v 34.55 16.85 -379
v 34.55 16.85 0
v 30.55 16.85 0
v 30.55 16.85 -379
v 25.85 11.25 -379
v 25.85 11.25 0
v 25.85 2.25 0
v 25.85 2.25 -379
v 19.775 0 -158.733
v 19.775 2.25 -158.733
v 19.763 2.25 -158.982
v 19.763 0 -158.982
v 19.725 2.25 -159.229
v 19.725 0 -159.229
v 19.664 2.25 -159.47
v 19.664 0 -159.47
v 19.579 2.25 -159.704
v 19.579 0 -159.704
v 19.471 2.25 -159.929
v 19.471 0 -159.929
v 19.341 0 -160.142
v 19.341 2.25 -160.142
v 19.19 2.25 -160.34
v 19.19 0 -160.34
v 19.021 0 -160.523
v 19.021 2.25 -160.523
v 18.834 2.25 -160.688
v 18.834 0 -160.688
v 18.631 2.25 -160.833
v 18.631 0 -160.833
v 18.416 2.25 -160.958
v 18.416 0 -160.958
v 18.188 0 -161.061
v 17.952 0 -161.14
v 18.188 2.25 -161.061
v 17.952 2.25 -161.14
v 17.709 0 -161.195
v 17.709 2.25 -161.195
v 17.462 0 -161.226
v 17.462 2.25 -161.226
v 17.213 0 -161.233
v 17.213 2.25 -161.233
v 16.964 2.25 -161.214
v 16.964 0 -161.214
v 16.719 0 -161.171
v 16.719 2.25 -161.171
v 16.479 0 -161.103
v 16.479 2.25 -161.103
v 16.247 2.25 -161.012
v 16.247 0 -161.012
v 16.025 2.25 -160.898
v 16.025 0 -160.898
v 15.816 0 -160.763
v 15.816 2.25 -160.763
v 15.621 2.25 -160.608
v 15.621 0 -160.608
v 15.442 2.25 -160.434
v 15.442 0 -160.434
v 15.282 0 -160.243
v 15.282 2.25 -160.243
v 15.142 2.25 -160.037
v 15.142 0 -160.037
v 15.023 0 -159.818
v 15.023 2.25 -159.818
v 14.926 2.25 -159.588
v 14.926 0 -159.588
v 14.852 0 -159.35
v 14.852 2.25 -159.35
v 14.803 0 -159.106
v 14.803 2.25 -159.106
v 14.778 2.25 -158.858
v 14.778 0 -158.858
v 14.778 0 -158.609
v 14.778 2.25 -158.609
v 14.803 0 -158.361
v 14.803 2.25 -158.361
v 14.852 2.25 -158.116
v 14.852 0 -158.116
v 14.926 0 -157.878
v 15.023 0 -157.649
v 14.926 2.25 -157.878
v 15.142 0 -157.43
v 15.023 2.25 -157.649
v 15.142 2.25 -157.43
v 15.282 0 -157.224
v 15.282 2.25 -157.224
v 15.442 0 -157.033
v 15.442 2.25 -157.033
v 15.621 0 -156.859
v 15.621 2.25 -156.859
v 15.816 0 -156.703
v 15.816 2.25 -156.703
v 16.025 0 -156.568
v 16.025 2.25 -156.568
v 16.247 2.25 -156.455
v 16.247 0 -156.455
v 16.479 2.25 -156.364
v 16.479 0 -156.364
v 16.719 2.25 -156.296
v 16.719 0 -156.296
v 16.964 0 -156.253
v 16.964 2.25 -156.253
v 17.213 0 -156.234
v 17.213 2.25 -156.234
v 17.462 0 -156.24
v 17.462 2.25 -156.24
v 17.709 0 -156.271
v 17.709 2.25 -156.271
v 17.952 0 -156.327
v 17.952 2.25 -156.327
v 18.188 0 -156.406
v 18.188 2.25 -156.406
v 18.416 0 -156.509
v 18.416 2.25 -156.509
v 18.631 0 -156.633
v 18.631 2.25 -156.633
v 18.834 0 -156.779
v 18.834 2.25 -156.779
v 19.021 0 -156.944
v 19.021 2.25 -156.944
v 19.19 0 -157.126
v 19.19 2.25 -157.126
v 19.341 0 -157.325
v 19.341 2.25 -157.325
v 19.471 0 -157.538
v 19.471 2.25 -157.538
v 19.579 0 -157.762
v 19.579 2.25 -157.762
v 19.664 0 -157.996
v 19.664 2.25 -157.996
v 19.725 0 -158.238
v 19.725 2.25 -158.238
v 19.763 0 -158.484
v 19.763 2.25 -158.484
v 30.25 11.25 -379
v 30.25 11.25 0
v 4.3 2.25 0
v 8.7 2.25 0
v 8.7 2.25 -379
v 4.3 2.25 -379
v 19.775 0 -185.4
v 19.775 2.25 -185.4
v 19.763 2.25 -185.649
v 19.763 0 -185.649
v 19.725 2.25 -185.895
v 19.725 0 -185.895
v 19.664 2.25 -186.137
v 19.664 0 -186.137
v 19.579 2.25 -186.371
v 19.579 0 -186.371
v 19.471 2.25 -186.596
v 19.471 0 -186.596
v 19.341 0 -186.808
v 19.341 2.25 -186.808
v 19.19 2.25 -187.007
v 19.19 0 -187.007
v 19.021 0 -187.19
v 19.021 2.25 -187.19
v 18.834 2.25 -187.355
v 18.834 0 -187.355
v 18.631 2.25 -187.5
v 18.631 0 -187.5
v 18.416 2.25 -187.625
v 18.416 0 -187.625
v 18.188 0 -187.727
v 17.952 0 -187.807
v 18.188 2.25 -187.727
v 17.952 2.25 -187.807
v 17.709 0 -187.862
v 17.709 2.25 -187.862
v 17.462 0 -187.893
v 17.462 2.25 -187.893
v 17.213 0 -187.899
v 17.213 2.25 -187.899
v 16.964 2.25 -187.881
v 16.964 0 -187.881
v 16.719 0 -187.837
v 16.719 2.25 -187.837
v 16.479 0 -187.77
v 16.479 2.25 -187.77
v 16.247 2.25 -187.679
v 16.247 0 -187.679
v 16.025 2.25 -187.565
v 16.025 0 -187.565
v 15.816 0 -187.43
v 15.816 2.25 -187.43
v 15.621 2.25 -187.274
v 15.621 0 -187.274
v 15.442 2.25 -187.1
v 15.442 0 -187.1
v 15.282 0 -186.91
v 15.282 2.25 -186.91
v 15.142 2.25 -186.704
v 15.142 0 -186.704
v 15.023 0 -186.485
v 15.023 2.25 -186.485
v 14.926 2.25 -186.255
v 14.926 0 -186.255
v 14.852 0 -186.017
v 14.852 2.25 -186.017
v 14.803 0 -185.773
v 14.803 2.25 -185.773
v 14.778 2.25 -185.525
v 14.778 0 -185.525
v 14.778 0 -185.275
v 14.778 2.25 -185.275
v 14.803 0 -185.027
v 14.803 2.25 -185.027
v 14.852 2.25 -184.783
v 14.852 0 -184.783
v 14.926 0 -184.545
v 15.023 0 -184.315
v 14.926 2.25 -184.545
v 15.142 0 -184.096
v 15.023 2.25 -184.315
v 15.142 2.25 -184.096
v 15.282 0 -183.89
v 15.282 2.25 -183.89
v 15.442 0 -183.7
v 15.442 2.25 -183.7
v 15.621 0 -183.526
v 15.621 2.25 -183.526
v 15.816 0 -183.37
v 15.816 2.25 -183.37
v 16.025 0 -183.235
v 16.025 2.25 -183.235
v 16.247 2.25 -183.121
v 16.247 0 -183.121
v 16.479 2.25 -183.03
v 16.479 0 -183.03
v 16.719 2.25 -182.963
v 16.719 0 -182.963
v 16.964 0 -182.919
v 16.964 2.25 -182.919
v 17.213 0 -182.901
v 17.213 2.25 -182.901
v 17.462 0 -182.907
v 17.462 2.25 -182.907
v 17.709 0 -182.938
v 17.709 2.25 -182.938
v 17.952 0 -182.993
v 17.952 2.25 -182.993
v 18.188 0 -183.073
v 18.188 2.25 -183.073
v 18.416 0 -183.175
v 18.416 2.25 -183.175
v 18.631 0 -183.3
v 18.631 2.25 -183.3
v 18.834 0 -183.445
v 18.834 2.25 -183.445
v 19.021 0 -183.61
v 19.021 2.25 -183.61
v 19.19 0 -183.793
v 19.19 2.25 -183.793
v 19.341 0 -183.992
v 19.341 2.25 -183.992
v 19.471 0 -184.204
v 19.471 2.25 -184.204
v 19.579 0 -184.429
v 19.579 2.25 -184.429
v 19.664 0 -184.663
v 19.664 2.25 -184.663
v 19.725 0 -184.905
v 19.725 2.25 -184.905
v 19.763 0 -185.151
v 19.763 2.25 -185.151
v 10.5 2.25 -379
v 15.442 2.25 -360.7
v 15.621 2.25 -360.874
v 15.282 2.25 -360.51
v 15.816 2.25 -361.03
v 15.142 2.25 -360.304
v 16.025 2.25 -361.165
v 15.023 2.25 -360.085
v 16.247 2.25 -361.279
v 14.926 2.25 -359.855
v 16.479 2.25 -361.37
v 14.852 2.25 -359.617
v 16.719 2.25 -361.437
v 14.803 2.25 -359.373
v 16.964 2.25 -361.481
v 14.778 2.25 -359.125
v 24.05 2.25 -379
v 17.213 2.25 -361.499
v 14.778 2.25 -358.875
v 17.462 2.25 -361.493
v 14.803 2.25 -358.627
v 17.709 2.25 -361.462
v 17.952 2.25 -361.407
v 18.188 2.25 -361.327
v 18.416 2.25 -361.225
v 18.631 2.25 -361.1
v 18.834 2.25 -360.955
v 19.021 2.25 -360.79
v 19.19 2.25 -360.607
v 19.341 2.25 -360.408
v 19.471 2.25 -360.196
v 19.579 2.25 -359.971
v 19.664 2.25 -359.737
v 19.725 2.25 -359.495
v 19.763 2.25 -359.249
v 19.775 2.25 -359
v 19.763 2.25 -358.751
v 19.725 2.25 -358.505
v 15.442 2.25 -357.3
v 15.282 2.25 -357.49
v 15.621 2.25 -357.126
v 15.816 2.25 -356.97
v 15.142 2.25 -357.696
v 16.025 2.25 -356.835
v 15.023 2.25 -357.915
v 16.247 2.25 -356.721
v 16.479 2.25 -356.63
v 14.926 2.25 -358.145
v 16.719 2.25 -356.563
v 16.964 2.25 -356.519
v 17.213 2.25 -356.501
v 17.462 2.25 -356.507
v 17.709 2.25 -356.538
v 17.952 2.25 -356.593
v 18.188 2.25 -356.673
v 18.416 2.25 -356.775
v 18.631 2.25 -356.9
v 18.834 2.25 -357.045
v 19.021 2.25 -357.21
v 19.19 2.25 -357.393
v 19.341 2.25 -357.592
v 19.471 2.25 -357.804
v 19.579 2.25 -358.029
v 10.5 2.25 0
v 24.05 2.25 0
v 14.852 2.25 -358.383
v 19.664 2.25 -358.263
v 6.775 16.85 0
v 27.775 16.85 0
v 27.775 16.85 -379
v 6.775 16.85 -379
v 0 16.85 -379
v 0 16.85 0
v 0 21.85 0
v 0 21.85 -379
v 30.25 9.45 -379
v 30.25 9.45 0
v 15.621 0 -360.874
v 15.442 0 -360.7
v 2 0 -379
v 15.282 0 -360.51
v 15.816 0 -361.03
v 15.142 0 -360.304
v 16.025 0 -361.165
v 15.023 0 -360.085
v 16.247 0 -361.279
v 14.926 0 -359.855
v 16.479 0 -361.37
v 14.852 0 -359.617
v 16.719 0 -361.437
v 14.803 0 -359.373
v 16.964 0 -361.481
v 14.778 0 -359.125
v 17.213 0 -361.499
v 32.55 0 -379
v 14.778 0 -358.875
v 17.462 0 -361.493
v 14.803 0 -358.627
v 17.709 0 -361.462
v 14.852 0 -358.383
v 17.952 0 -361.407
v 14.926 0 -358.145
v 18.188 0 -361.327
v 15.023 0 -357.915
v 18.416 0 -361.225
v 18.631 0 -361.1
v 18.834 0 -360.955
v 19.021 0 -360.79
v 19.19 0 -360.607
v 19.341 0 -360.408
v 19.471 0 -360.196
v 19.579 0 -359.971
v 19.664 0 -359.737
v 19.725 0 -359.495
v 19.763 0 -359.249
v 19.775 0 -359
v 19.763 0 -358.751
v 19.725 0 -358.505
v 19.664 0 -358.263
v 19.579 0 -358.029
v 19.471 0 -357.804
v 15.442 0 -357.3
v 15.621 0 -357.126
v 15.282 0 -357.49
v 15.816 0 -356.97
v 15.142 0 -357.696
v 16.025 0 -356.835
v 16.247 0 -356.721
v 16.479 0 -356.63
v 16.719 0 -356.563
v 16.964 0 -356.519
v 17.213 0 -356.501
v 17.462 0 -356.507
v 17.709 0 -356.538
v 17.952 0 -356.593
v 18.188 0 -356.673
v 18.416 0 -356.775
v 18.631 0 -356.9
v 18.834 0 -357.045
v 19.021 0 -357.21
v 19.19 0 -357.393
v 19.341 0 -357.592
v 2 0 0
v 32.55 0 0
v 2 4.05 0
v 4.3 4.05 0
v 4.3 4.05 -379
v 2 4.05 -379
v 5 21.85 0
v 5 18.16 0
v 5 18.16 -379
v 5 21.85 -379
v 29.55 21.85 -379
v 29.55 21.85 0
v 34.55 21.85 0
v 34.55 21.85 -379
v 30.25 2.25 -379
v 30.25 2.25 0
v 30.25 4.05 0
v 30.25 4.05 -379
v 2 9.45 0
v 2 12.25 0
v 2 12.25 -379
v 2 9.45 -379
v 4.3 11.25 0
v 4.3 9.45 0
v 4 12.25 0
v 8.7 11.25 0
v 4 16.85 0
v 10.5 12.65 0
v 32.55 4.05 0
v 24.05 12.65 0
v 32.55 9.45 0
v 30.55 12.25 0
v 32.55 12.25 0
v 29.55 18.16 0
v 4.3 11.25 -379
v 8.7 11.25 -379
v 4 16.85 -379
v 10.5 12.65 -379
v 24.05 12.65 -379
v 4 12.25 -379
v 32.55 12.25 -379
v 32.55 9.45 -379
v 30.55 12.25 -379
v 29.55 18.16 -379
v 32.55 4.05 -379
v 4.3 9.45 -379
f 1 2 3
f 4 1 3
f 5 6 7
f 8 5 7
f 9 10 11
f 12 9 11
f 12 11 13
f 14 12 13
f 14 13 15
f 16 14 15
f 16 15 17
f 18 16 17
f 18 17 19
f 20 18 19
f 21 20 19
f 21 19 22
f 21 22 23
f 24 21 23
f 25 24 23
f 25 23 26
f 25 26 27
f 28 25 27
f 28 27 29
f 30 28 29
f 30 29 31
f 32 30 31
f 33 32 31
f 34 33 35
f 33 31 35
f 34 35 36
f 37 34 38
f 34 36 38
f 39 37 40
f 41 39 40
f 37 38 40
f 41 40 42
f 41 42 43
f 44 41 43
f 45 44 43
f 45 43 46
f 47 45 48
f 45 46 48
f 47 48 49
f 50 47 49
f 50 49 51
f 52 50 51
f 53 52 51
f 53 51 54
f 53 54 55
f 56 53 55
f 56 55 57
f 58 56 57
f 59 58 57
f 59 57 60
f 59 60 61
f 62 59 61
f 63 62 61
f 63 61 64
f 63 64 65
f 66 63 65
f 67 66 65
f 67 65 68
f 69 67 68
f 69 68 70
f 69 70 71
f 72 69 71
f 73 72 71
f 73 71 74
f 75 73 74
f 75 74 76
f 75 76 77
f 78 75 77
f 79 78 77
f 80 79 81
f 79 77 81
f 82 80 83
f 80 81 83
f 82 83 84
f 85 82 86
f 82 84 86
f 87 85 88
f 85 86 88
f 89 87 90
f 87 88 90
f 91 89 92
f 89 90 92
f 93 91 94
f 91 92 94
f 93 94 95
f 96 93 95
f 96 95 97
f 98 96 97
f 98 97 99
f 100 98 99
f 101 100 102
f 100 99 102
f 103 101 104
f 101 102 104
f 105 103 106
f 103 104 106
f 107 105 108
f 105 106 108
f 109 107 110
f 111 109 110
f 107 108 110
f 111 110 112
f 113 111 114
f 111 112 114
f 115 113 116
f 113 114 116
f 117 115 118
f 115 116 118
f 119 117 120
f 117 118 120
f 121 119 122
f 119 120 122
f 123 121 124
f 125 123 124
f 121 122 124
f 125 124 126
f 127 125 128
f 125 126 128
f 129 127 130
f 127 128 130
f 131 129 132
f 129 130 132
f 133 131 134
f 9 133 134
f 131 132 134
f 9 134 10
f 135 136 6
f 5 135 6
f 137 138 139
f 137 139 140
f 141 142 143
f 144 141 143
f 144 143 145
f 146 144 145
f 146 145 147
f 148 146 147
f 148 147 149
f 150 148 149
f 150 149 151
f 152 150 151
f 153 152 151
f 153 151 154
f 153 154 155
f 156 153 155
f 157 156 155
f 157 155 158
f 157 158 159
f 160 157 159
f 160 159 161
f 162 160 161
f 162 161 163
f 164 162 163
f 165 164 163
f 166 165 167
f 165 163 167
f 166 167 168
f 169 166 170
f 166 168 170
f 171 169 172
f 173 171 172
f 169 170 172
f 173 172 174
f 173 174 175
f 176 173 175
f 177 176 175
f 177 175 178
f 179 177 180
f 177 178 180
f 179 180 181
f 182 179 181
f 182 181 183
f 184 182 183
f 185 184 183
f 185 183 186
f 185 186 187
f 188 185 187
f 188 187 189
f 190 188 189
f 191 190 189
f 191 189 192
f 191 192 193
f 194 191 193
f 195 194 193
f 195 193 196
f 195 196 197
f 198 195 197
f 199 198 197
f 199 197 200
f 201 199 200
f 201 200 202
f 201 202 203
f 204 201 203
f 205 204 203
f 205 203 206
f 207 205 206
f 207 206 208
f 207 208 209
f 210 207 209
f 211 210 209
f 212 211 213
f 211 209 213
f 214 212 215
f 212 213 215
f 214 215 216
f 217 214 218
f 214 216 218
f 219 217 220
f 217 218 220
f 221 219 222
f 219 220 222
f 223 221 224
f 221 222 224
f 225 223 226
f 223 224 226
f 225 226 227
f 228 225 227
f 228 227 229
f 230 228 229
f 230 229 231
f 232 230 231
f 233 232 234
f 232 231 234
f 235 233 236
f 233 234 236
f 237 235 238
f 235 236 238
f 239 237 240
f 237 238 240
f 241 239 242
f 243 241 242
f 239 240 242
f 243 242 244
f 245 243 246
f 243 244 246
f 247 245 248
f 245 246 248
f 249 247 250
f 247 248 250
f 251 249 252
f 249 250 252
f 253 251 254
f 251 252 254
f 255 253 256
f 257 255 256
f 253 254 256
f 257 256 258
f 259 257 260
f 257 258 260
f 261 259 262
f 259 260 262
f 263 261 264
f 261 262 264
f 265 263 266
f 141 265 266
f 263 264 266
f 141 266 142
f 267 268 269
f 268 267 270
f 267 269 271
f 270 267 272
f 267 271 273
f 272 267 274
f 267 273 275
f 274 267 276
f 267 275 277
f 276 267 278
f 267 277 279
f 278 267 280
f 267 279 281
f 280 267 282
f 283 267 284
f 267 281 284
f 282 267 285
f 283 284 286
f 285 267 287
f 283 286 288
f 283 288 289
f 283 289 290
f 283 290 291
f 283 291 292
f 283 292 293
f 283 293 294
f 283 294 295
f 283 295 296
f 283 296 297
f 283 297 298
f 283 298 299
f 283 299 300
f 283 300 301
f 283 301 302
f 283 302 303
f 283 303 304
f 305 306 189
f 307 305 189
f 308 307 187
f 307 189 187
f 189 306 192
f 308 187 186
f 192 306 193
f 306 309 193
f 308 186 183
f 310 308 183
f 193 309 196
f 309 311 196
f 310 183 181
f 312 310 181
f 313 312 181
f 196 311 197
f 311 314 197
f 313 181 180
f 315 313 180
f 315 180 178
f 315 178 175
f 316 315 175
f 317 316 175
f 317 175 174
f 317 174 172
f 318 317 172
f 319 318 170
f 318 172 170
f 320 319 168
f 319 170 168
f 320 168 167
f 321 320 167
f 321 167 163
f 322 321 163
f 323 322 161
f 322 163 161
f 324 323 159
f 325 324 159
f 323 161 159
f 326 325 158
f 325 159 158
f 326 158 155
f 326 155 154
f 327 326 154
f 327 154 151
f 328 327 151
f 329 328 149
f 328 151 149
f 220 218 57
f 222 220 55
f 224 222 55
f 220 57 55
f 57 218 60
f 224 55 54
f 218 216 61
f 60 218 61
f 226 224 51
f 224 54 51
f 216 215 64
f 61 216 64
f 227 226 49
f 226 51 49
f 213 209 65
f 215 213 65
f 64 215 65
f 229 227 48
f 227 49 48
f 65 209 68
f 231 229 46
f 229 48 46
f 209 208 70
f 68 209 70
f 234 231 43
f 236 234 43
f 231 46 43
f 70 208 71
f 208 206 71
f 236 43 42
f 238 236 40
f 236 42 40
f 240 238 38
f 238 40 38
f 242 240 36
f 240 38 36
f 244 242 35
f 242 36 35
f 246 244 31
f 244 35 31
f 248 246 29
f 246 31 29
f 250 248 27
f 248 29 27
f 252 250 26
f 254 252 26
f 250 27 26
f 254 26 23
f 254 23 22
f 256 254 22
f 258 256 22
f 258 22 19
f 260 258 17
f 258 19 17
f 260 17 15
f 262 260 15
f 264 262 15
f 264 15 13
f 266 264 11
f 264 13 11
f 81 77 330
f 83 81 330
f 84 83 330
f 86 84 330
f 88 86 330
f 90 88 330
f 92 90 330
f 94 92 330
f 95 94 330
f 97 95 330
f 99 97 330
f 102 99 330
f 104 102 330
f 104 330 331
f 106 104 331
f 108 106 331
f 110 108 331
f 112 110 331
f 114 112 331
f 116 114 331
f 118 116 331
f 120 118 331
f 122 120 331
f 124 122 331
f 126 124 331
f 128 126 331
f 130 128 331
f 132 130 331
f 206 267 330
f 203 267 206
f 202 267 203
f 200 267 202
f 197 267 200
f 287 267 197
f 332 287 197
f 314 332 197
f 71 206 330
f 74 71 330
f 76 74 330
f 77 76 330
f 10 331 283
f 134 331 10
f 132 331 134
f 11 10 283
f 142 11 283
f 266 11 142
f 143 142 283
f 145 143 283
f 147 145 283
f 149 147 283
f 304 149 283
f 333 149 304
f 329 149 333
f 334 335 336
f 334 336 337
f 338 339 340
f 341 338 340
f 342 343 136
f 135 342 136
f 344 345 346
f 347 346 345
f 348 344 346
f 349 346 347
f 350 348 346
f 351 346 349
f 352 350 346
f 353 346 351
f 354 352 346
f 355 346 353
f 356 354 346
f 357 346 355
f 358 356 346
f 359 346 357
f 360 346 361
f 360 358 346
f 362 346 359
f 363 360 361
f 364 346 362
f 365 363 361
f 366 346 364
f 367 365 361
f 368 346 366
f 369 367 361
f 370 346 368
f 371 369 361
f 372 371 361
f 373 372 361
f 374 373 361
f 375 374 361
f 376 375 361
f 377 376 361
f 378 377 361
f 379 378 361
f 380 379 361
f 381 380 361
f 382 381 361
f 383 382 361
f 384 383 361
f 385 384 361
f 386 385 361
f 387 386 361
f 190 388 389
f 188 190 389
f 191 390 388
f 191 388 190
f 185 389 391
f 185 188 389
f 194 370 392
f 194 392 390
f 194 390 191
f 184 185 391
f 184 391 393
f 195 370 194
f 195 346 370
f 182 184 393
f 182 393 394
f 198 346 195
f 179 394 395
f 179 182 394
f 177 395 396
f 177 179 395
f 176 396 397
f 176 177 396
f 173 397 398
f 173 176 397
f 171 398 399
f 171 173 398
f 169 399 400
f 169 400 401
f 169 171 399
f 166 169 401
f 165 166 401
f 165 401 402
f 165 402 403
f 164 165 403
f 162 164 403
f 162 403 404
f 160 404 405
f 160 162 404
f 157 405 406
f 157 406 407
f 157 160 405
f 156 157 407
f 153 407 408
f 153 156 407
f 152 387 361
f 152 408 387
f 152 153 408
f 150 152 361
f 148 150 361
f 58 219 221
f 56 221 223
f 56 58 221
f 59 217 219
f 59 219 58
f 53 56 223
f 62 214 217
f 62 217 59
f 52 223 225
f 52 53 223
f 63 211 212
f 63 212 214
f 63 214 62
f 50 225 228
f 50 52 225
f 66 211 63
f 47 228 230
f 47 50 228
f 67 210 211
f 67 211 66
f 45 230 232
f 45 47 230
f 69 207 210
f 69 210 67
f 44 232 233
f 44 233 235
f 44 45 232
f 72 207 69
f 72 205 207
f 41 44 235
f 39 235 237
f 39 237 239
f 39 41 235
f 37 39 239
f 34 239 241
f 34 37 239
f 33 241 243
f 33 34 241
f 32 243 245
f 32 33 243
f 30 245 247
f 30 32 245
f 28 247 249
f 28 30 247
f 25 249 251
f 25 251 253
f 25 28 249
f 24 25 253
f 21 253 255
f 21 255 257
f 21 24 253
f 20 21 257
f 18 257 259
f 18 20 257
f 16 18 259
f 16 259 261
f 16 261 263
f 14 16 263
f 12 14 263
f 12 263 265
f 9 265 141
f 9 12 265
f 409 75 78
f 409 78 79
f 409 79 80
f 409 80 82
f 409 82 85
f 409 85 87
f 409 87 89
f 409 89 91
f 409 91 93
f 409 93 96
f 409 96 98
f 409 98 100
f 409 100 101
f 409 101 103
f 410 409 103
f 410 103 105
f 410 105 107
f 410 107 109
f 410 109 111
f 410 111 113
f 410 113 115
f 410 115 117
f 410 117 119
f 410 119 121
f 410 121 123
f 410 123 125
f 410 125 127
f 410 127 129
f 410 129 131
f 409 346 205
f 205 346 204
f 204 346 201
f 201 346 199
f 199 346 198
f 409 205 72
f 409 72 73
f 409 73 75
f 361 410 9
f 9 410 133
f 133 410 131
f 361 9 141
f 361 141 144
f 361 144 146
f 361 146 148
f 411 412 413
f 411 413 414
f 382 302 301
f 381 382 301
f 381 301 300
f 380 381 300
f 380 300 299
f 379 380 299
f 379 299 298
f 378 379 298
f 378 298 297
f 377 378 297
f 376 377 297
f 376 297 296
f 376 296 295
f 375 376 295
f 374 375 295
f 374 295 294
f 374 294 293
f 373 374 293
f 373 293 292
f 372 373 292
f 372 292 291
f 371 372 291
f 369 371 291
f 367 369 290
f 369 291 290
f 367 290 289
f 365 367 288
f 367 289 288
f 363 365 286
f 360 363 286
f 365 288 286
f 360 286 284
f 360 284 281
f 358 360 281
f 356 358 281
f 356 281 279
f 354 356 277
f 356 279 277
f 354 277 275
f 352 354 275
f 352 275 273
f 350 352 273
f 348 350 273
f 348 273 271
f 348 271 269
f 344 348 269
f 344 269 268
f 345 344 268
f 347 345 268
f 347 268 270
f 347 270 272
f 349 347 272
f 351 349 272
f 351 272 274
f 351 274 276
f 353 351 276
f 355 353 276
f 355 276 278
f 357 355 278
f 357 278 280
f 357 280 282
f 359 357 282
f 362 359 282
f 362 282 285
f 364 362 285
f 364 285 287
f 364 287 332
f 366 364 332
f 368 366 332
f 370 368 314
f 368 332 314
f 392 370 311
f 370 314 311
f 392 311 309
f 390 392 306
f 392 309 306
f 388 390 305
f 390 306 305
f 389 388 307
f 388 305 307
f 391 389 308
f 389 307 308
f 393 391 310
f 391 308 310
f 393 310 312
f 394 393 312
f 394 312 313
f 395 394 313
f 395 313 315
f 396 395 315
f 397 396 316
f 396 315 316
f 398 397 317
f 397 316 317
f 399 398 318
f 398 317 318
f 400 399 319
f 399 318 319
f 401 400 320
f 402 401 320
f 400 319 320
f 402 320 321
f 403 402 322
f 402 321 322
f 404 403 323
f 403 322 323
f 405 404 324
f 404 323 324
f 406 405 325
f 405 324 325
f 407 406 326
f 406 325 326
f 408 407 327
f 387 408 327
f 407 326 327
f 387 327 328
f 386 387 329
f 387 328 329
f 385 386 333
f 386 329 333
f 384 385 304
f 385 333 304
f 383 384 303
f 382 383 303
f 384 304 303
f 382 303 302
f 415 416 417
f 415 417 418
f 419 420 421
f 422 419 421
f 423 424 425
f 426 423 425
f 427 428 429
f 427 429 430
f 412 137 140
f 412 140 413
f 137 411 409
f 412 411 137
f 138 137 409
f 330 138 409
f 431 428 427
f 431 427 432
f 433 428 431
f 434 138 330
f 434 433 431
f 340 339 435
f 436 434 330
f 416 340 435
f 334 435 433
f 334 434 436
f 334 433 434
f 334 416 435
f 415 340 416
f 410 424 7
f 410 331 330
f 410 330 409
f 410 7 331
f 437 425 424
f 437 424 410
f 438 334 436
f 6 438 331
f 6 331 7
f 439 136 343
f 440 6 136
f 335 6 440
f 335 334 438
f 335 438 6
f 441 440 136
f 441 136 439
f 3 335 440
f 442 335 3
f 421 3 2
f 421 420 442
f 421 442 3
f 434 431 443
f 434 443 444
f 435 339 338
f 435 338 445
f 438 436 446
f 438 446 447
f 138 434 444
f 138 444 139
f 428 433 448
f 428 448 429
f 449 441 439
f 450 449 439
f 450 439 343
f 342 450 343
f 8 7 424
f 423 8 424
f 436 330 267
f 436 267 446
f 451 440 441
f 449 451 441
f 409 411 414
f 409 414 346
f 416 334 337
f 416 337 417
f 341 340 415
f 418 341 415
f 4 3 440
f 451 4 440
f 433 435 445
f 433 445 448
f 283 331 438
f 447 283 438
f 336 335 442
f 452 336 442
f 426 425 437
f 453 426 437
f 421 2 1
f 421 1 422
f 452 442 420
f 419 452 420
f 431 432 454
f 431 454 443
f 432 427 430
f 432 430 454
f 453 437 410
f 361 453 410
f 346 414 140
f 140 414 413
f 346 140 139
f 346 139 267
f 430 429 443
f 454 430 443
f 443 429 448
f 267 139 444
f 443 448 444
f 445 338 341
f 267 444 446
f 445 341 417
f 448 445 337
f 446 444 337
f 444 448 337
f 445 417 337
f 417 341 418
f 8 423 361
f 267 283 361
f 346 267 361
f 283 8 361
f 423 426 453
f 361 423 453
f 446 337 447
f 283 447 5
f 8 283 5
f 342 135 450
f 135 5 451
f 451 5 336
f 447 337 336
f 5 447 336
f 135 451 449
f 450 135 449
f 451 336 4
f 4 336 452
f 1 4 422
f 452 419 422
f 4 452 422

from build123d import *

# Parameters (mm, degrees)
SKETCH2_W                 = 34.55
SKETCH2_H                 = 21.85
BOSS_EXTRUDE1_DEPTH       = 379
CUT_EXTRUDE1_DEPTH        = 379
SKETCH5_W                 = 13.55
SKETCH5_H                 = 10.4
CUT_EXTRUDE2_DEPTH        = 379
F_5_0MM_DOWEL_HOLE2_D     = 5
F_5_0MM_DOWEL_HOLE2_DEPTH = 2.25


with BuildPart() as part:
    # Sketch2 → Boss-Extrude1 (new body)
    with BuildSketch(Plane.XY):
        with Locations((17.275, 10.925)):
            Rectangle(SKETCH2_W, SKETCH2_H)
    extrude(amount=-BOSS_EXTRUDE1_DEPTH)

    # Sketch3 → Cut-Extrude1 (cut)
    with BuildSketch(Plane.XY):
        Polygon((29.55, 21.85), (17.275, 21.85), (17.275, 16.85), (27.775, 16.85), (29.55, 18.1599631), align=None)
        Polygon((34.55, 0), (34.55, 16.85), (30.55, 16.85), (30.55, 12.25), (32.55, 12.25), (32.55, 9.45), (30.25, 9.45), (30.25, 11.25), (25.85, 11.25), (25.85, 2.25), (30.25, 2.25), (30.25, 4.05), (32.55, 4.05), (32.55, 0), align=None)
    cut_extrude1 = extrude(amount=-CUT_EXTRUDE1_DEPTH, mode=Mode.SUBTRACT)

    # Mirror1: Cut-Extrude1 across plane
    add(cut_extrude1.mirror(Plane(origin=(17.275, 0, 0), x_dir=(0, 0, 1), z_dir=(1, 0, 0))), mode=Mode.SUBTRACT)

    # Sketch5 → Cut-Extrude2 (cut)
    with BuildSketch(Plane.XY):
        with Locations((17.275, 7.45)):
            Rectangle(SKETCH5_W, SKETCH5_H)
    extrude(amount=-CUT_EXTRUDE2_DEPTH, mode=Mode.SUBTRACT)

    # Ø5.0mm Dowel Hole2
    with Locations(Plane(origin=(0, 0, 0), x_dir=(-1, 0, 0), z_dir=(0, -1, 0))):
        with Locations((-17.275, 359), (-17.275, 185.4), (-17.275, 158.733333333)):
            Hole(F_5_0MM_DOWEL_HOLE2_D / 2, depth=F_5_0MM_DOWEL_HOLE2_DEPTH)


solid = part.part
